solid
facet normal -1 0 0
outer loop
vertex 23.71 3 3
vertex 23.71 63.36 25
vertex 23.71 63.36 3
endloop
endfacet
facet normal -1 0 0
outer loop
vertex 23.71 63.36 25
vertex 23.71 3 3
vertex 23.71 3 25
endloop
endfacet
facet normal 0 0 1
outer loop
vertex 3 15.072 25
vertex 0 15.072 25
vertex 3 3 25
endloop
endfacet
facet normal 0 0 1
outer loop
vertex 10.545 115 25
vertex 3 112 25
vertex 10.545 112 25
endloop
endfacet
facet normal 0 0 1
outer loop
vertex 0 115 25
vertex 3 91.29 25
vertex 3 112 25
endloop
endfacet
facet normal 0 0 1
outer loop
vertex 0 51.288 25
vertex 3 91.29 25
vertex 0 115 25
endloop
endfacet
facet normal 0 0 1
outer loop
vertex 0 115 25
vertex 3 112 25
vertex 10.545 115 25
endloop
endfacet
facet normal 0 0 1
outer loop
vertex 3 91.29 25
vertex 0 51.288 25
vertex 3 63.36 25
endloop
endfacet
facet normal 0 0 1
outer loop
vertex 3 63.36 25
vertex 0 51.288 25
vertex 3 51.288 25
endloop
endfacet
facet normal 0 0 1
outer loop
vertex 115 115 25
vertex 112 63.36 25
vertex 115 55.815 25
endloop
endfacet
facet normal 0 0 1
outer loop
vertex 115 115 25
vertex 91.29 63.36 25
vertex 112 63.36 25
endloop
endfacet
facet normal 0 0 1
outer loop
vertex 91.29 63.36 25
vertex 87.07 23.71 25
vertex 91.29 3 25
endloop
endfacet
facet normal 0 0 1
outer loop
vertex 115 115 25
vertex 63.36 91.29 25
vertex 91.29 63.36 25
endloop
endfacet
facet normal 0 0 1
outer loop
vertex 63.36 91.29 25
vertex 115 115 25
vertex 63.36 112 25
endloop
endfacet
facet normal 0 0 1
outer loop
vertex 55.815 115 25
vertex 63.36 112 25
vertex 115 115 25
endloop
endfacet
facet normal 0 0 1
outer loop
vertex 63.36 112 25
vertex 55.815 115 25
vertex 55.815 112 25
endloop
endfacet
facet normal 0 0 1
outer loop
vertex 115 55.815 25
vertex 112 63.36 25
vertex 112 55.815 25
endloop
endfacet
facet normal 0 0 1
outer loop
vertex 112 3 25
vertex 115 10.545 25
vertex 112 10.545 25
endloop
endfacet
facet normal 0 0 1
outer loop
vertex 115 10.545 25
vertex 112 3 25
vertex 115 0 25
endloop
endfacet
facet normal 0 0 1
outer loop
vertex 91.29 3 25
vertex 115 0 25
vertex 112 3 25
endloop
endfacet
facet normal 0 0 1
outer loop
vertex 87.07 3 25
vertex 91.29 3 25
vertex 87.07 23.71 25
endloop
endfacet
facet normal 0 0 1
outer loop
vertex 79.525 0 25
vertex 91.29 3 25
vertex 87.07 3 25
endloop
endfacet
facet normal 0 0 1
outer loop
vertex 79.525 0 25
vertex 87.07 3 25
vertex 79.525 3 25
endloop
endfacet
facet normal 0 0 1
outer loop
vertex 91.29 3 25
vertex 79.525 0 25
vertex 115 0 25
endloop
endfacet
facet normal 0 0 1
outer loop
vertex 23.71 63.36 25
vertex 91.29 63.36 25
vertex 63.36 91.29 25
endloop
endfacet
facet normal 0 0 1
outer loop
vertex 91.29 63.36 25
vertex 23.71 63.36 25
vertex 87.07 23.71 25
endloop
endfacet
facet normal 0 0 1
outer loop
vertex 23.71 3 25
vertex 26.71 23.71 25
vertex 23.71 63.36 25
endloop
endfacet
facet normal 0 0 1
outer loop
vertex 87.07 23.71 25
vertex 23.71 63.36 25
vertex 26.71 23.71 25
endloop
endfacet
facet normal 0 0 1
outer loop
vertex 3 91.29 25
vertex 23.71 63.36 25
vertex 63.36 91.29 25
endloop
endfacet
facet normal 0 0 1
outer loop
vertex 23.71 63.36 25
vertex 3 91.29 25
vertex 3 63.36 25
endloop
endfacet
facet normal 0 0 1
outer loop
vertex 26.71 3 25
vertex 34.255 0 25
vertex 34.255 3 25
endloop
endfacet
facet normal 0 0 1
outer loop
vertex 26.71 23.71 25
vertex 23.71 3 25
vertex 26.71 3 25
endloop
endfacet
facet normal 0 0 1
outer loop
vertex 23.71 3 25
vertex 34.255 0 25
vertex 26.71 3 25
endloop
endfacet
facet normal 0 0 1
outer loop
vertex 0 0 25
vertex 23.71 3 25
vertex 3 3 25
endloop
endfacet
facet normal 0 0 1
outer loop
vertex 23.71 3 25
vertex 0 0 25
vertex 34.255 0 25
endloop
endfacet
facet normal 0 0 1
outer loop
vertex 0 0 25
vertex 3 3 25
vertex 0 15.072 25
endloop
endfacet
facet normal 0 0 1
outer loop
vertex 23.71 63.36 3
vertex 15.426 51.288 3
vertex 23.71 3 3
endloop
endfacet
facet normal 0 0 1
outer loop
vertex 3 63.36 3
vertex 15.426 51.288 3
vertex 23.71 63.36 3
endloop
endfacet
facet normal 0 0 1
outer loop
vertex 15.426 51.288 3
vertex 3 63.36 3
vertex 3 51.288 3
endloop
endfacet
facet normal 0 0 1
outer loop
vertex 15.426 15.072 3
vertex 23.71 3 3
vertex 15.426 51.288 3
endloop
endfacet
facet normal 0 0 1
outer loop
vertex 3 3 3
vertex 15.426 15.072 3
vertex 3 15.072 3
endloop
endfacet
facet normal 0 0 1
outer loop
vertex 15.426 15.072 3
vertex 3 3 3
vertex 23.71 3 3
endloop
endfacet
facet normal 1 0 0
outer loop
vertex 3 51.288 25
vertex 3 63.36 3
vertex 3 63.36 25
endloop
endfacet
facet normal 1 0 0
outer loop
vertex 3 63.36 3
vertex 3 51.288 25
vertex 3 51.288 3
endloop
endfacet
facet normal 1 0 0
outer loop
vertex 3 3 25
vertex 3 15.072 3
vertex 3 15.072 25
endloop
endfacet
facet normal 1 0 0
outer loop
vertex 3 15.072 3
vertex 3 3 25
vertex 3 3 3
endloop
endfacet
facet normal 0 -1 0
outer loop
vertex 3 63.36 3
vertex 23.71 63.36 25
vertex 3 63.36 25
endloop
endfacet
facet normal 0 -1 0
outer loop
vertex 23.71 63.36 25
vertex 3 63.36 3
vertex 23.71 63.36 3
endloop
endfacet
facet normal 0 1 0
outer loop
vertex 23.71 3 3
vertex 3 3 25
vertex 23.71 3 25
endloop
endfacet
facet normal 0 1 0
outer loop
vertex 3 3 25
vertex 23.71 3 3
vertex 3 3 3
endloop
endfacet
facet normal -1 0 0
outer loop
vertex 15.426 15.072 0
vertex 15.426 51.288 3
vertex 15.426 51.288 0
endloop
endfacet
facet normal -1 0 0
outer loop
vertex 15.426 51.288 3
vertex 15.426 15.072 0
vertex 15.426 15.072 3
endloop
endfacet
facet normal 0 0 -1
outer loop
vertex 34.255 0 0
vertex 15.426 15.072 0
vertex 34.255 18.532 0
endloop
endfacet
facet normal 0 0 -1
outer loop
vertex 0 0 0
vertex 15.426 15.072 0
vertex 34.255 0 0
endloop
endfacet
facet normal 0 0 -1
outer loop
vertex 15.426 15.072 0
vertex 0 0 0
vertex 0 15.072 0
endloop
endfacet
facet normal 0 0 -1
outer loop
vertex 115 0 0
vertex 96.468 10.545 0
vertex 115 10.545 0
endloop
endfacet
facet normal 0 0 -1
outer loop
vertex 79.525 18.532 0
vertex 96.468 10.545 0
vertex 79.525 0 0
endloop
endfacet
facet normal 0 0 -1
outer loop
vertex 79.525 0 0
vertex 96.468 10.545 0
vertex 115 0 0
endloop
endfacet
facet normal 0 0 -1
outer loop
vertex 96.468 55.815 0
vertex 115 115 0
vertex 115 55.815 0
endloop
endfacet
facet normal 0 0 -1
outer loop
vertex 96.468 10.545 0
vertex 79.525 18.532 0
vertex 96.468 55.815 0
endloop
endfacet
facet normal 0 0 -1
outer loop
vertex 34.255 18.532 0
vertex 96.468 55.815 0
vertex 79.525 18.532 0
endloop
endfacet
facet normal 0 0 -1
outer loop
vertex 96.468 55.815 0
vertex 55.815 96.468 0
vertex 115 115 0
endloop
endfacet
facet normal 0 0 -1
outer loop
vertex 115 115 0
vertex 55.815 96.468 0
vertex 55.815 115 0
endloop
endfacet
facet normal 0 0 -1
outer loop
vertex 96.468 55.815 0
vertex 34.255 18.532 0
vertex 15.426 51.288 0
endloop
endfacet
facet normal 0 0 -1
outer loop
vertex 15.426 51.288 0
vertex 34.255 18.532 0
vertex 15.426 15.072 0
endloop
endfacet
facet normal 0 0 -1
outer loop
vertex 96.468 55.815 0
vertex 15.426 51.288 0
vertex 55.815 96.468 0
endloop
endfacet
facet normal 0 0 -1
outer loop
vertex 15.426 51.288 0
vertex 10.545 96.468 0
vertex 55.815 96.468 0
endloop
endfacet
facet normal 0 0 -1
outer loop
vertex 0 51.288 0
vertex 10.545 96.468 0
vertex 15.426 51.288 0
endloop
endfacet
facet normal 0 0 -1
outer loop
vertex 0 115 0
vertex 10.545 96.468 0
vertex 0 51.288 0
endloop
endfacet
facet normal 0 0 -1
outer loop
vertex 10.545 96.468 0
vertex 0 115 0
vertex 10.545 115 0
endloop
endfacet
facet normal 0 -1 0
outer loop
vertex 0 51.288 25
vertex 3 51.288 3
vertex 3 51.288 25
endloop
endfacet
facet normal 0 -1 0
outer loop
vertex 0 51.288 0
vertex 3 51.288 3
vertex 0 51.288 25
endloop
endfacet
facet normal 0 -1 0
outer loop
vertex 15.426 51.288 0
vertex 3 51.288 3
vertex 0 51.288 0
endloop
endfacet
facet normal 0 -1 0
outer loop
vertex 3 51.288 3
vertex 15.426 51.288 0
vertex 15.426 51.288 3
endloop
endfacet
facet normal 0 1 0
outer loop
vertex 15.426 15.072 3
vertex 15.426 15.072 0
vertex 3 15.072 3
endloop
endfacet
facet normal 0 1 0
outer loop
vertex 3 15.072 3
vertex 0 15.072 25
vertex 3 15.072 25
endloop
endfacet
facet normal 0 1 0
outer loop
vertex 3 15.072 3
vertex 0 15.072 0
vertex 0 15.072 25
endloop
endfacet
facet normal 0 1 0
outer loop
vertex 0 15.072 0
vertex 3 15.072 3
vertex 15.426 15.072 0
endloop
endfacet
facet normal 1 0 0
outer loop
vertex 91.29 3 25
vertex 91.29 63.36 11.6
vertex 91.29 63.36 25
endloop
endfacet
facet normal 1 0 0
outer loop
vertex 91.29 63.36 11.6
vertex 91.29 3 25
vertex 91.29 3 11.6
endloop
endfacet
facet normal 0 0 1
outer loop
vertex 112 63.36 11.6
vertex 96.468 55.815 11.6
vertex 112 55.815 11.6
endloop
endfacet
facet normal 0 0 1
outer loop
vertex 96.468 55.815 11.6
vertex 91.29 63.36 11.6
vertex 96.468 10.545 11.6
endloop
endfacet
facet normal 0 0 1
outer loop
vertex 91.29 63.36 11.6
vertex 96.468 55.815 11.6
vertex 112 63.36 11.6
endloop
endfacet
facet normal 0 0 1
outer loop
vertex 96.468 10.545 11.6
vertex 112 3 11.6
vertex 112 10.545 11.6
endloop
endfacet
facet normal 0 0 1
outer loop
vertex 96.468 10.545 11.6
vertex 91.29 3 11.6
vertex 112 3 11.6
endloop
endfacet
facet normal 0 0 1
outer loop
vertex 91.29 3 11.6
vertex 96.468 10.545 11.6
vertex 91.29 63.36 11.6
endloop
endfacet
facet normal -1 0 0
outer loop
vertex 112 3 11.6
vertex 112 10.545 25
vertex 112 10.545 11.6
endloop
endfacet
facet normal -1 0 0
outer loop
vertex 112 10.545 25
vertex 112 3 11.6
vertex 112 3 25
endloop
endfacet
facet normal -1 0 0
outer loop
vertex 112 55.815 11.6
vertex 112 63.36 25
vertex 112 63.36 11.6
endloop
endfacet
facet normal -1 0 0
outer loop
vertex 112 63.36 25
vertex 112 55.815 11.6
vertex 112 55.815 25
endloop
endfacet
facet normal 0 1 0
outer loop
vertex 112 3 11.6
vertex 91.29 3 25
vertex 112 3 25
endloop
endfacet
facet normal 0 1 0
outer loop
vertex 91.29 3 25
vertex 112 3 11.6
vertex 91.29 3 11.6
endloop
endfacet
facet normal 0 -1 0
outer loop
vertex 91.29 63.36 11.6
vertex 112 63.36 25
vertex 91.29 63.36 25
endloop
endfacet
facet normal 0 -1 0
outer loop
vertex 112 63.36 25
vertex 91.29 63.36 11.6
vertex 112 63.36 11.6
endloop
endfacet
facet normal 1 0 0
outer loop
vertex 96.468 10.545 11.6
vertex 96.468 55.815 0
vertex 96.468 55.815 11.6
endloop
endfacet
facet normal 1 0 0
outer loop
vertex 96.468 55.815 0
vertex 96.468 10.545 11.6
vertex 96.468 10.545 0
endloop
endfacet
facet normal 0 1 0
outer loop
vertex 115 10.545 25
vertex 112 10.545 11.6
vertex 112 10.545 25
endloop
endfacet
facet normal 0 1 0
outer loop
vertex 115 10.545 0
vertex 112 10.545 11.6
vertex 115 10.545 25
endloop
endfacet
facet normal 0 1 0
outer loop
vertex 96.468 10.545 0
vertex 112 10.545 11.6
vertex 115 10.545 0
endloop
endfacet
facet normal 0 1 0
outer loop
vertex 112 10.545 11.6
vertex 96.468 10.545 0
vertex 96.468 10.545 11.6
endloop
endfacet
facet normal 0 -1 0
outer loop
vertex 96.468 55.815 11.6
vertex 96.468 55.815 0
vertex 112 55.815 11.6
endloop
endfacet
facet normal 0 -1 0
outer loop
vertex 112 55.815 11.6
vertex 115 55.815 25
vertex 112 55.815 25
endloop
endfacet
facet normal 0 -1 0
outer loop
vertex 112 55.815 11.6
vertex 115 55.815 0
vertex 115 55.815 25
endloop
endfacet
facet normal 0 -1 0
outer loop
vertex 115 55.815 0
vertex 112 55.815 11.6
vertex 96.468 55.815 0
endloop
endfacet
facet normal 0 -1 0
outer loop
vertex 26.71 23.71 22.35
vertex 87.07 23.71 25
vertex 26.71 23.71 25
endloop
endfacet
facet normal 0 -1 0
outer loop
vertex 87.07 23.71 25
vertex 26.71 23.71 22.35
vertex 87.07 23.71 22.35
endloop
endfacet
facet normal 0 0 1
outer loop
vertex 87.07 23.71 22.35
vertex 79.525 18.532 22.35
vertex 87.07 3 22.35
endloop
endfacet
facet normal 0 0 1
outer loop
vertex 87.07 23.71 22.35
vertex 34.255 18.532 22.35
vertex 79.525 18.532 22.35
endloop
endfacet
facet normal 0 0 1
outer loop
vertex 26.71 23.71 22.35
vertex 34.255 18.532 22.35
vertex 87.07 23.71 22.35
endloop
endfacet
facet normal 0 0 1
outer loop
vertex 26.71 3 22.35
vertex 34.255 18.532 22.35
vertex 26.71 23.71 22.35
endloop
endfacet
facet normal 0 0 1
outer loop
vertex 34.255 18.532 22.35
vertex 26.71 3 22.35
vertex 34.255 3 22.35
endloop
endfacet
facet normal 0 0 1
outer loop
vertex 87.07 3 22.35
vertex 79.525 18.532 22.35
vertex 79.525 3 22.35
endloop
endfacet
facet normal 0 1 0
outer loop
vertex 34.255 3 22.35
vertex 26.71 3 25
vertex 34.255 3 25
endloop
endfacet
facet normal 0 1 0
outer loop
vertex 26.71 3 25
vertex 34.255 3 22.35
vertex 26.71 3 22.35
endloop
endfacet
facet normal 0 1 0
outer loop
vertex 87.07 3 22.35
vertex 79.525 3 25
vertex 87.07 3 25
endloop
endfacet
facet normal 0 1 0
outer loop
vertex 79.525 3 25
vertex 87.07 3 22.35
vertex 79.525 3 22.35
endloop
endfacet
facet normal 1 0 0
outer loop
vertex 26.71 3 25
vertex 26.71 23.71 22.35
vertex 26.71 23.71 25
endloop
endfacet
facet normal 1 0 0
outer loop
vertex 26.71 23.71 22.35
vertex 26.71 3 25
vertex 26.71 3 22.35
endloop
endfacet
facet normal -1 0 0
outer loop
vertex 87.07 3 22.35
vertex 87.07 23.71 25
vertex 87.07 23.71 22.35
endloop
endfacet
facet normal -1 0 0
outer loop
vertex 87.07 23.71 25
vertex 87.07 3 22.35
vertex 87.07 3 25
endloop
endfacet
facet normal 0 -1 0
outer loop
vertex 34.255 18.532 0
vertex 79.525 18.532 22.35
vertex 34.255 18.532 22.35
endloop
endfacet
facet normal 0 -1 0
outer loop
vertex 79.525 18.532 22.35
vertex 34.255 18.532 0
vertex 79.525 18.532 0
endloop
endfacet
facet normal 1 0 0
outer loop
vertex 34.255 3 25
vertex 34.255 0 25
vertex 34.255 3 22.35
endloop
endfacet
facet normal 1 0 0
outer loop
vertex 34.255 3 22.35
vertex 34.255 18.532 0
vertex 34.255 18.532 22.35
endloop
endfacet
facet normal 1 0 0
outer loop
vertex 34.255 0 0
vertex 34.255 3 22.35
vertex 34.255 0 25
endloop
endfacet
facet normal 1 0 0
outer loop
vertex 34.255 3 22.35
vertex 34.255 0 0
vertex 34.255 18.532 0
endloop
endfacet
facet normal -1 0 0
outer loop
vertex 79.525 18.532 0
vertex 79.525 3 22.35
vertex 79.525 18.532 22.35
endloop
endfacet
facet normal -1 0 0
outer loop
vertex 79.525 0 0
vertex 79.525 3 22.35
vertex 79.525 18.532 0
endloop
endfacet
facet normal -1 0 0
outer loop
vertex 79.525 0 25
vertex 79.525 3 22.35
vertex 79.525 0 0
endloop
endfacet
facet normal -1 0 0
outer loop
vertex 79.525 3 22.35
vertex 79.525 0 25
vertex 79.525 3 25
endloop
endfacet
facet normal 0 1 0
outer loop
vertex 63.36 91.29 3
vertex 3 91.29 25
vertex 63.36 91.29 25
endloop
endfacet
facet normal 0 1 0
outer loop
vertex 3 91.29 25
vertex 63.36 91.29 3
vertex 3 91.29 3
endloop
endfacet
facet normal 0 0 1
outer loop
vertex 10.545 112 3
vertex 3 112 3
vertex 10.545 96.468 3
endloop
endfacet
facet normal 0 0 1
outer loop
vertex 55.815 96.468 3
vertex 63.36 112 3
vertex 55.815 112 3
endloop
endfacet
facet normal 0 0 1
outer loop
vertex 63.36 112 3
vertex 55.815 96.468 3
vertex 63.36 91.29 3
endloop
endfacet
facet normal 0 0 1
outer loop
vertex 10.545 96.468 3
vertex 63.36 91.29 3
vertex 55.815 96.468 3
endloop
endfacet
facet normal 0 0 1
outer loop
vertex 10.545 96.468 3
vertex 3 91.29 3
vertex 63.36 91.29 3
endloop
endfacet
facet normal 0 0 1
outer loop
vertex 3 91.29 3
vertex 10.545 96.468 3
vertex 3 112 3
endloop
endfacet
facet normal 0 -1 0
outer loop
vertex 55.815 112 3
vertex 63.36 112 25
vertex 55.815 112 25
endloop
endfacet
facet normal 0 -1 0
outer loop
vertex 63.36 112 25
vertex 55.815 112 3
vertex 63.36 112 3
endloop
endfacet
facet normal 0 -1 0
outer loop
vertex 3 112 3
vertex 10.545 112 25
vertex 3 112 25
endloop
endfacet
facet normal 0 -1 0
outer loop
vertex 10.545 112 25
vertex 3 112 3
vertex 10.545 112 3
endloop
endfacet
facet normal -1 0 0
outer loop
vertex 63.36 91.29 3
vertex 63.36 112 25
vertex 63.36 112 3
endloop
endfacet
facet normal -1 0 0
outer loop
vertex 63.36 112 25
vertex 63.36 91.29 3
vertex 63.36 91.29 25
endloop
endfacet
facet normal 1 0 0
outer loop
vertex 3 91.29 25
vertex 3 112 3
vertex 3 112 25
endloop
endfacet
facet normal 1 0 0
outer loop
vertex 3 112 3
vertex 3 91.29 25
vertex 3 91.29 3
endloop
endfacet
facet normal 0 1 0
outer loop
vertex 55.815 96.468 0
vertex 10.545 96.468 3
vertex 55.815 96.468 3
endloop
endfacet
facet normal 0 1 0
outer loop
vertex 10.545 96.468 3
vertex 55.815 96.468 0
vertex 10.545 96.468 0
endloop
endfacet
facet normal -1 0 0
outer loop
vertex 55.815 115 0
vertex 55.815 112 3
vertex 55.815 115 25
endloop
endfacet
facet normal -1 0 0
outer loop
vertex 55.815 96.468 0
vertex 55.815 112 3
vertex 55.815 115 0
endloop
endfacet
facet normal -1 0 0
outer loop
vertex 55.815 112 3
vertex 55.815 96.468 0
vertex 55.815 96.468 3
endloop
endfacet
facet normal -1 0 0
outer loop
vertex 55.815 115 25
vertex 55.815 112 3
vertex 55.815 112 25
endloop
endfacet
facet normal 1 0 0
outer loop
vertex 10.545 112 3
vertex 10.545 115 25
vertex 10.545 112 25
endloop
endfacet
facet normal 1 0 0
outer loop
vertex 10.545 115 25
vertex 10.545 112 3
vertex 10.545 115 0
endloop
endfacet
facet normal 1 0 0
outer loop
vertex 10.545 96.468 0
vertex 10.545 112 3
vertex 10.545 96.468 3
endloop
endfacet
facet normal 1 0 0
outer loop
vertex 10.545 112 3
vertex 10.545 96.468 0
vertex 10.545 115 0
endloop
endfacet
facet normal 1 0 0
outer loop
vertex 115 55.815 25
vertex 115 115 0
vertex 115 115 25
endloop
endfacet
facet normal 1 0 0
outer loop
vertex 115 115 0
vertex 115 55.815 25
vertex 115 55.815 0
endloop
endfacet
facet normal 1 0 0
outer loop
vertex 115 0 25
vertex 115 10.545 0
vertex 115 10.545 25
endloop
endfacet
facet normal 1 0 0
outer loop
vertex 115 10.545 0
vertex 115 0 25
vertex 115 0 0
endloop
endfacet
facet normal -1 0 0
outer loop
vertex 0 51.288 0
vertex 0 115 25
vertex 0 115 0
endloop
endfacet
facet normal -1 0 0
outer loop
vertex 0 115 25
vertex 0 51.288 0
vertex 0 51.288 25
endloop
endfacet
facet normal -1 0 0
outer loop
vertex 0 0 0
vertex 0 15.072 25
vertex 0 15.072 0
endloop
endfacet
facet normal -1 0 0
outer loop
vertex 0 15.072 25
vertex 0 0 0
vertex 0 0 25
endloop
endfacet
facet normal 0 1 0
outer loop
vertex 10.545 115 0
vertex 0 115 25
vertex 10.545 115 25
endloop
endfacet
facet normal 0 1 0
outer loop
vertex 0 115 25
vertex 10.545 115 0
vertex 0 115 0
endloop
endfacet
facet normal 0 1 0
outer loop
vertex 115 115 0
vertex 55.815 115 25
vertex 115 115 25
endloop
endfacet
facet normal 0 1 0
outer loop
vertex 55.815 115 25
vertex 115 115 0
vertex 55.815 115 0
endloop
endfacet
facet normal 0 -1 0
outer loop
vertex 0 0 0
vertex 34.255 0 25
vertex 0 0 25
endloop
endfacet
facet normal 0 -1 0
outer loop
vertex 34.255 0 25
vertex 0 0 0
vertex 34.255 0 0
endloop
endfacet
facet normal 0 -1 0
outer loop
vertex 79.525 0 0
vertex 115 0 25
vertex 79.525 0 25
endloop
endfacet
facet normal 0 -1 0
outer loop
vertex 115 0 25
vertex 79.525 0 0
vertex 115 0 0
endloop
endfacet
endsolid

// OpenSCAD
// file: SquarePileLib.scad
module LeftPile(wallThickness, totalHeight, singlePileHeight, singlePileWidth, singlePileLength, pileCount, openingSizePercent = .75){
    pileHeight = (pileCount * singlePileHeight) + .5;
    lengthOpeningSize = singlePileLength * openingSizePercent;
    widthOpeningSize = singlePileWidth * openingSizePercent;
    blockerSize = (singlePileWidth - widthOpeningSize) / 2;
    
    translate([wallThickness, wallThickness, totalHeight - pileHeight])
        cube([singlePileLength, singlePileWidth, pileHeight]);
    translate([-.00001, wallThickness + (blockerSize), 0])
        cube([wallThickness + lengthOpeningSize, widthOpeningSize, totalHeight]);
}

module RightPile(wallThickness, totalHeight, singlePileHeight, singlePileWidth, singlePileLength, pileCount, openingSizePercent = .75){
    translate([0, wallThickness + wallThickness + singlePileWidth, 0])
        rotate([0, 0, 180])
            LeftPile(wallThickness, totalHeight, singlePileHeight, singlePileWidth, singlePileLength, pileCount);
}

module BottomPile(wallThickness, totalHeight, singlePileHeight, singlePileWidth, singlePileLength, pileCount, openingSizePercent = .75){
    translate([wallThickness + wallThickness + singlePileWidth, 0, 0])
        rotate([0, 0, 90])
            LeftPile(wallThickness, totalHeight, singlePileHeight, singlePileWidth, singlePileLength, pileCount);
}

module TopPile(wallThickness, totalHeight, singlePileHeight, singlePileWidth, singlePileLength, pileCount, openingSizePercent = .75){
        rotate([0, 0, 270])
            LeftPile(wallThickness, totalHeight, singlePileHeight, singlePileWidth, singlePileLength, pileCount);
}
// file: ColonistsWarehouseExtensionLib.scad
include<SquarePileLib.scad>
//25.82 by 32.82 by 2.15
singleWarehouseExtensionPileHeight = 2.15;
singleWarehouseExtensionPileWidth = 59.86 + .5;
singleWarehouseExtensionPileLength = 20.21 + .5;

module LeftWarehouseExtensionPile(wallThickness, totalHeight, warehouseExtensionPileCount){
    LeftPile(
        wallThickness,
        totalHeight,
        singleWarehouseExtensionPileHeight,
        singleWarehouseExtensionPileWidth,
        singleWarehouseExtensionPileLength,
        warehouseExtensionPileCount,
        .6);
}

module RightWarehouseExtensionPile(wallThickness, totalHeight, warehouseExtensionPileCount){
    RightPile(
        wallThickness,
        totalHeight,
        singleWarehouseExtensionPileHeight,
        singleWarehouseExtensionPileWidth,
        singleWarehouseExtensionPileLength,
        warehouseExtensionPileCount,
        .6);
}

module BottomWarehouseExtensionPile(wallThickness, totalHeight, warehouseExtensionPileCount){
    BottomPile(
        wallThickness,
        totalHeight,
        singleWarehouseExtensionPileHeight,
        singleWarehouseExtensionPileWidth,
        singleWarehouseExtensionPileLength,
        warehouseExtensionPileCount,
        .6);
}

module TopWarehouseExtensionPile(wallThickness, totalHeight, warehouseExtensionPileCount){
    TopPile(
        wallThickness,
        totalHeight,
        singleWarehouseExtensionPileHeight,
        singleWarehouseExtensionPileWidth,
        singleWarehouseExtensionPileLength,
        warehouseExtensionPileCount,
        .6);
}

function warehouseExtensionPileHeight(warehouseExtensionPileCount) =
    (warehouseExtensionPileCount * singleWarehouseExtensionPileHeight) + .5;
// main file
include<ColonistsWarehouseExtensionLib.scad>
difference() {
    testBoxHeight = warehouseExtensionPileHeight(10) + 3;
    testBoxLength = 115;
    testBoxWidth = 115;
    wallThickness = 3;
    
    cube([testBoxLength, testBoxWidth, testBoxHeight]);
    LeftWarehouseExtensionPile(wallThickness, testBoxHeight, 10);
//    translate([100 - (15.05 + .8), 0, 0])
    translate([testBoxLength, 0, 0])
        RightWarehouseExtensionPile(wallThickness, testBoxHeight, 6);
    translate([singleWarehouseExtensionPileLength + wallThickness, 0, 0])
        BottomWarehouseExtensionPile(wallThickness, testBoxHeight, 1);
    translate([0, testBoxWidth, 0])
        TopWarehouseExtensionPile(wallThickness, testBoxHeight, 10);
}
